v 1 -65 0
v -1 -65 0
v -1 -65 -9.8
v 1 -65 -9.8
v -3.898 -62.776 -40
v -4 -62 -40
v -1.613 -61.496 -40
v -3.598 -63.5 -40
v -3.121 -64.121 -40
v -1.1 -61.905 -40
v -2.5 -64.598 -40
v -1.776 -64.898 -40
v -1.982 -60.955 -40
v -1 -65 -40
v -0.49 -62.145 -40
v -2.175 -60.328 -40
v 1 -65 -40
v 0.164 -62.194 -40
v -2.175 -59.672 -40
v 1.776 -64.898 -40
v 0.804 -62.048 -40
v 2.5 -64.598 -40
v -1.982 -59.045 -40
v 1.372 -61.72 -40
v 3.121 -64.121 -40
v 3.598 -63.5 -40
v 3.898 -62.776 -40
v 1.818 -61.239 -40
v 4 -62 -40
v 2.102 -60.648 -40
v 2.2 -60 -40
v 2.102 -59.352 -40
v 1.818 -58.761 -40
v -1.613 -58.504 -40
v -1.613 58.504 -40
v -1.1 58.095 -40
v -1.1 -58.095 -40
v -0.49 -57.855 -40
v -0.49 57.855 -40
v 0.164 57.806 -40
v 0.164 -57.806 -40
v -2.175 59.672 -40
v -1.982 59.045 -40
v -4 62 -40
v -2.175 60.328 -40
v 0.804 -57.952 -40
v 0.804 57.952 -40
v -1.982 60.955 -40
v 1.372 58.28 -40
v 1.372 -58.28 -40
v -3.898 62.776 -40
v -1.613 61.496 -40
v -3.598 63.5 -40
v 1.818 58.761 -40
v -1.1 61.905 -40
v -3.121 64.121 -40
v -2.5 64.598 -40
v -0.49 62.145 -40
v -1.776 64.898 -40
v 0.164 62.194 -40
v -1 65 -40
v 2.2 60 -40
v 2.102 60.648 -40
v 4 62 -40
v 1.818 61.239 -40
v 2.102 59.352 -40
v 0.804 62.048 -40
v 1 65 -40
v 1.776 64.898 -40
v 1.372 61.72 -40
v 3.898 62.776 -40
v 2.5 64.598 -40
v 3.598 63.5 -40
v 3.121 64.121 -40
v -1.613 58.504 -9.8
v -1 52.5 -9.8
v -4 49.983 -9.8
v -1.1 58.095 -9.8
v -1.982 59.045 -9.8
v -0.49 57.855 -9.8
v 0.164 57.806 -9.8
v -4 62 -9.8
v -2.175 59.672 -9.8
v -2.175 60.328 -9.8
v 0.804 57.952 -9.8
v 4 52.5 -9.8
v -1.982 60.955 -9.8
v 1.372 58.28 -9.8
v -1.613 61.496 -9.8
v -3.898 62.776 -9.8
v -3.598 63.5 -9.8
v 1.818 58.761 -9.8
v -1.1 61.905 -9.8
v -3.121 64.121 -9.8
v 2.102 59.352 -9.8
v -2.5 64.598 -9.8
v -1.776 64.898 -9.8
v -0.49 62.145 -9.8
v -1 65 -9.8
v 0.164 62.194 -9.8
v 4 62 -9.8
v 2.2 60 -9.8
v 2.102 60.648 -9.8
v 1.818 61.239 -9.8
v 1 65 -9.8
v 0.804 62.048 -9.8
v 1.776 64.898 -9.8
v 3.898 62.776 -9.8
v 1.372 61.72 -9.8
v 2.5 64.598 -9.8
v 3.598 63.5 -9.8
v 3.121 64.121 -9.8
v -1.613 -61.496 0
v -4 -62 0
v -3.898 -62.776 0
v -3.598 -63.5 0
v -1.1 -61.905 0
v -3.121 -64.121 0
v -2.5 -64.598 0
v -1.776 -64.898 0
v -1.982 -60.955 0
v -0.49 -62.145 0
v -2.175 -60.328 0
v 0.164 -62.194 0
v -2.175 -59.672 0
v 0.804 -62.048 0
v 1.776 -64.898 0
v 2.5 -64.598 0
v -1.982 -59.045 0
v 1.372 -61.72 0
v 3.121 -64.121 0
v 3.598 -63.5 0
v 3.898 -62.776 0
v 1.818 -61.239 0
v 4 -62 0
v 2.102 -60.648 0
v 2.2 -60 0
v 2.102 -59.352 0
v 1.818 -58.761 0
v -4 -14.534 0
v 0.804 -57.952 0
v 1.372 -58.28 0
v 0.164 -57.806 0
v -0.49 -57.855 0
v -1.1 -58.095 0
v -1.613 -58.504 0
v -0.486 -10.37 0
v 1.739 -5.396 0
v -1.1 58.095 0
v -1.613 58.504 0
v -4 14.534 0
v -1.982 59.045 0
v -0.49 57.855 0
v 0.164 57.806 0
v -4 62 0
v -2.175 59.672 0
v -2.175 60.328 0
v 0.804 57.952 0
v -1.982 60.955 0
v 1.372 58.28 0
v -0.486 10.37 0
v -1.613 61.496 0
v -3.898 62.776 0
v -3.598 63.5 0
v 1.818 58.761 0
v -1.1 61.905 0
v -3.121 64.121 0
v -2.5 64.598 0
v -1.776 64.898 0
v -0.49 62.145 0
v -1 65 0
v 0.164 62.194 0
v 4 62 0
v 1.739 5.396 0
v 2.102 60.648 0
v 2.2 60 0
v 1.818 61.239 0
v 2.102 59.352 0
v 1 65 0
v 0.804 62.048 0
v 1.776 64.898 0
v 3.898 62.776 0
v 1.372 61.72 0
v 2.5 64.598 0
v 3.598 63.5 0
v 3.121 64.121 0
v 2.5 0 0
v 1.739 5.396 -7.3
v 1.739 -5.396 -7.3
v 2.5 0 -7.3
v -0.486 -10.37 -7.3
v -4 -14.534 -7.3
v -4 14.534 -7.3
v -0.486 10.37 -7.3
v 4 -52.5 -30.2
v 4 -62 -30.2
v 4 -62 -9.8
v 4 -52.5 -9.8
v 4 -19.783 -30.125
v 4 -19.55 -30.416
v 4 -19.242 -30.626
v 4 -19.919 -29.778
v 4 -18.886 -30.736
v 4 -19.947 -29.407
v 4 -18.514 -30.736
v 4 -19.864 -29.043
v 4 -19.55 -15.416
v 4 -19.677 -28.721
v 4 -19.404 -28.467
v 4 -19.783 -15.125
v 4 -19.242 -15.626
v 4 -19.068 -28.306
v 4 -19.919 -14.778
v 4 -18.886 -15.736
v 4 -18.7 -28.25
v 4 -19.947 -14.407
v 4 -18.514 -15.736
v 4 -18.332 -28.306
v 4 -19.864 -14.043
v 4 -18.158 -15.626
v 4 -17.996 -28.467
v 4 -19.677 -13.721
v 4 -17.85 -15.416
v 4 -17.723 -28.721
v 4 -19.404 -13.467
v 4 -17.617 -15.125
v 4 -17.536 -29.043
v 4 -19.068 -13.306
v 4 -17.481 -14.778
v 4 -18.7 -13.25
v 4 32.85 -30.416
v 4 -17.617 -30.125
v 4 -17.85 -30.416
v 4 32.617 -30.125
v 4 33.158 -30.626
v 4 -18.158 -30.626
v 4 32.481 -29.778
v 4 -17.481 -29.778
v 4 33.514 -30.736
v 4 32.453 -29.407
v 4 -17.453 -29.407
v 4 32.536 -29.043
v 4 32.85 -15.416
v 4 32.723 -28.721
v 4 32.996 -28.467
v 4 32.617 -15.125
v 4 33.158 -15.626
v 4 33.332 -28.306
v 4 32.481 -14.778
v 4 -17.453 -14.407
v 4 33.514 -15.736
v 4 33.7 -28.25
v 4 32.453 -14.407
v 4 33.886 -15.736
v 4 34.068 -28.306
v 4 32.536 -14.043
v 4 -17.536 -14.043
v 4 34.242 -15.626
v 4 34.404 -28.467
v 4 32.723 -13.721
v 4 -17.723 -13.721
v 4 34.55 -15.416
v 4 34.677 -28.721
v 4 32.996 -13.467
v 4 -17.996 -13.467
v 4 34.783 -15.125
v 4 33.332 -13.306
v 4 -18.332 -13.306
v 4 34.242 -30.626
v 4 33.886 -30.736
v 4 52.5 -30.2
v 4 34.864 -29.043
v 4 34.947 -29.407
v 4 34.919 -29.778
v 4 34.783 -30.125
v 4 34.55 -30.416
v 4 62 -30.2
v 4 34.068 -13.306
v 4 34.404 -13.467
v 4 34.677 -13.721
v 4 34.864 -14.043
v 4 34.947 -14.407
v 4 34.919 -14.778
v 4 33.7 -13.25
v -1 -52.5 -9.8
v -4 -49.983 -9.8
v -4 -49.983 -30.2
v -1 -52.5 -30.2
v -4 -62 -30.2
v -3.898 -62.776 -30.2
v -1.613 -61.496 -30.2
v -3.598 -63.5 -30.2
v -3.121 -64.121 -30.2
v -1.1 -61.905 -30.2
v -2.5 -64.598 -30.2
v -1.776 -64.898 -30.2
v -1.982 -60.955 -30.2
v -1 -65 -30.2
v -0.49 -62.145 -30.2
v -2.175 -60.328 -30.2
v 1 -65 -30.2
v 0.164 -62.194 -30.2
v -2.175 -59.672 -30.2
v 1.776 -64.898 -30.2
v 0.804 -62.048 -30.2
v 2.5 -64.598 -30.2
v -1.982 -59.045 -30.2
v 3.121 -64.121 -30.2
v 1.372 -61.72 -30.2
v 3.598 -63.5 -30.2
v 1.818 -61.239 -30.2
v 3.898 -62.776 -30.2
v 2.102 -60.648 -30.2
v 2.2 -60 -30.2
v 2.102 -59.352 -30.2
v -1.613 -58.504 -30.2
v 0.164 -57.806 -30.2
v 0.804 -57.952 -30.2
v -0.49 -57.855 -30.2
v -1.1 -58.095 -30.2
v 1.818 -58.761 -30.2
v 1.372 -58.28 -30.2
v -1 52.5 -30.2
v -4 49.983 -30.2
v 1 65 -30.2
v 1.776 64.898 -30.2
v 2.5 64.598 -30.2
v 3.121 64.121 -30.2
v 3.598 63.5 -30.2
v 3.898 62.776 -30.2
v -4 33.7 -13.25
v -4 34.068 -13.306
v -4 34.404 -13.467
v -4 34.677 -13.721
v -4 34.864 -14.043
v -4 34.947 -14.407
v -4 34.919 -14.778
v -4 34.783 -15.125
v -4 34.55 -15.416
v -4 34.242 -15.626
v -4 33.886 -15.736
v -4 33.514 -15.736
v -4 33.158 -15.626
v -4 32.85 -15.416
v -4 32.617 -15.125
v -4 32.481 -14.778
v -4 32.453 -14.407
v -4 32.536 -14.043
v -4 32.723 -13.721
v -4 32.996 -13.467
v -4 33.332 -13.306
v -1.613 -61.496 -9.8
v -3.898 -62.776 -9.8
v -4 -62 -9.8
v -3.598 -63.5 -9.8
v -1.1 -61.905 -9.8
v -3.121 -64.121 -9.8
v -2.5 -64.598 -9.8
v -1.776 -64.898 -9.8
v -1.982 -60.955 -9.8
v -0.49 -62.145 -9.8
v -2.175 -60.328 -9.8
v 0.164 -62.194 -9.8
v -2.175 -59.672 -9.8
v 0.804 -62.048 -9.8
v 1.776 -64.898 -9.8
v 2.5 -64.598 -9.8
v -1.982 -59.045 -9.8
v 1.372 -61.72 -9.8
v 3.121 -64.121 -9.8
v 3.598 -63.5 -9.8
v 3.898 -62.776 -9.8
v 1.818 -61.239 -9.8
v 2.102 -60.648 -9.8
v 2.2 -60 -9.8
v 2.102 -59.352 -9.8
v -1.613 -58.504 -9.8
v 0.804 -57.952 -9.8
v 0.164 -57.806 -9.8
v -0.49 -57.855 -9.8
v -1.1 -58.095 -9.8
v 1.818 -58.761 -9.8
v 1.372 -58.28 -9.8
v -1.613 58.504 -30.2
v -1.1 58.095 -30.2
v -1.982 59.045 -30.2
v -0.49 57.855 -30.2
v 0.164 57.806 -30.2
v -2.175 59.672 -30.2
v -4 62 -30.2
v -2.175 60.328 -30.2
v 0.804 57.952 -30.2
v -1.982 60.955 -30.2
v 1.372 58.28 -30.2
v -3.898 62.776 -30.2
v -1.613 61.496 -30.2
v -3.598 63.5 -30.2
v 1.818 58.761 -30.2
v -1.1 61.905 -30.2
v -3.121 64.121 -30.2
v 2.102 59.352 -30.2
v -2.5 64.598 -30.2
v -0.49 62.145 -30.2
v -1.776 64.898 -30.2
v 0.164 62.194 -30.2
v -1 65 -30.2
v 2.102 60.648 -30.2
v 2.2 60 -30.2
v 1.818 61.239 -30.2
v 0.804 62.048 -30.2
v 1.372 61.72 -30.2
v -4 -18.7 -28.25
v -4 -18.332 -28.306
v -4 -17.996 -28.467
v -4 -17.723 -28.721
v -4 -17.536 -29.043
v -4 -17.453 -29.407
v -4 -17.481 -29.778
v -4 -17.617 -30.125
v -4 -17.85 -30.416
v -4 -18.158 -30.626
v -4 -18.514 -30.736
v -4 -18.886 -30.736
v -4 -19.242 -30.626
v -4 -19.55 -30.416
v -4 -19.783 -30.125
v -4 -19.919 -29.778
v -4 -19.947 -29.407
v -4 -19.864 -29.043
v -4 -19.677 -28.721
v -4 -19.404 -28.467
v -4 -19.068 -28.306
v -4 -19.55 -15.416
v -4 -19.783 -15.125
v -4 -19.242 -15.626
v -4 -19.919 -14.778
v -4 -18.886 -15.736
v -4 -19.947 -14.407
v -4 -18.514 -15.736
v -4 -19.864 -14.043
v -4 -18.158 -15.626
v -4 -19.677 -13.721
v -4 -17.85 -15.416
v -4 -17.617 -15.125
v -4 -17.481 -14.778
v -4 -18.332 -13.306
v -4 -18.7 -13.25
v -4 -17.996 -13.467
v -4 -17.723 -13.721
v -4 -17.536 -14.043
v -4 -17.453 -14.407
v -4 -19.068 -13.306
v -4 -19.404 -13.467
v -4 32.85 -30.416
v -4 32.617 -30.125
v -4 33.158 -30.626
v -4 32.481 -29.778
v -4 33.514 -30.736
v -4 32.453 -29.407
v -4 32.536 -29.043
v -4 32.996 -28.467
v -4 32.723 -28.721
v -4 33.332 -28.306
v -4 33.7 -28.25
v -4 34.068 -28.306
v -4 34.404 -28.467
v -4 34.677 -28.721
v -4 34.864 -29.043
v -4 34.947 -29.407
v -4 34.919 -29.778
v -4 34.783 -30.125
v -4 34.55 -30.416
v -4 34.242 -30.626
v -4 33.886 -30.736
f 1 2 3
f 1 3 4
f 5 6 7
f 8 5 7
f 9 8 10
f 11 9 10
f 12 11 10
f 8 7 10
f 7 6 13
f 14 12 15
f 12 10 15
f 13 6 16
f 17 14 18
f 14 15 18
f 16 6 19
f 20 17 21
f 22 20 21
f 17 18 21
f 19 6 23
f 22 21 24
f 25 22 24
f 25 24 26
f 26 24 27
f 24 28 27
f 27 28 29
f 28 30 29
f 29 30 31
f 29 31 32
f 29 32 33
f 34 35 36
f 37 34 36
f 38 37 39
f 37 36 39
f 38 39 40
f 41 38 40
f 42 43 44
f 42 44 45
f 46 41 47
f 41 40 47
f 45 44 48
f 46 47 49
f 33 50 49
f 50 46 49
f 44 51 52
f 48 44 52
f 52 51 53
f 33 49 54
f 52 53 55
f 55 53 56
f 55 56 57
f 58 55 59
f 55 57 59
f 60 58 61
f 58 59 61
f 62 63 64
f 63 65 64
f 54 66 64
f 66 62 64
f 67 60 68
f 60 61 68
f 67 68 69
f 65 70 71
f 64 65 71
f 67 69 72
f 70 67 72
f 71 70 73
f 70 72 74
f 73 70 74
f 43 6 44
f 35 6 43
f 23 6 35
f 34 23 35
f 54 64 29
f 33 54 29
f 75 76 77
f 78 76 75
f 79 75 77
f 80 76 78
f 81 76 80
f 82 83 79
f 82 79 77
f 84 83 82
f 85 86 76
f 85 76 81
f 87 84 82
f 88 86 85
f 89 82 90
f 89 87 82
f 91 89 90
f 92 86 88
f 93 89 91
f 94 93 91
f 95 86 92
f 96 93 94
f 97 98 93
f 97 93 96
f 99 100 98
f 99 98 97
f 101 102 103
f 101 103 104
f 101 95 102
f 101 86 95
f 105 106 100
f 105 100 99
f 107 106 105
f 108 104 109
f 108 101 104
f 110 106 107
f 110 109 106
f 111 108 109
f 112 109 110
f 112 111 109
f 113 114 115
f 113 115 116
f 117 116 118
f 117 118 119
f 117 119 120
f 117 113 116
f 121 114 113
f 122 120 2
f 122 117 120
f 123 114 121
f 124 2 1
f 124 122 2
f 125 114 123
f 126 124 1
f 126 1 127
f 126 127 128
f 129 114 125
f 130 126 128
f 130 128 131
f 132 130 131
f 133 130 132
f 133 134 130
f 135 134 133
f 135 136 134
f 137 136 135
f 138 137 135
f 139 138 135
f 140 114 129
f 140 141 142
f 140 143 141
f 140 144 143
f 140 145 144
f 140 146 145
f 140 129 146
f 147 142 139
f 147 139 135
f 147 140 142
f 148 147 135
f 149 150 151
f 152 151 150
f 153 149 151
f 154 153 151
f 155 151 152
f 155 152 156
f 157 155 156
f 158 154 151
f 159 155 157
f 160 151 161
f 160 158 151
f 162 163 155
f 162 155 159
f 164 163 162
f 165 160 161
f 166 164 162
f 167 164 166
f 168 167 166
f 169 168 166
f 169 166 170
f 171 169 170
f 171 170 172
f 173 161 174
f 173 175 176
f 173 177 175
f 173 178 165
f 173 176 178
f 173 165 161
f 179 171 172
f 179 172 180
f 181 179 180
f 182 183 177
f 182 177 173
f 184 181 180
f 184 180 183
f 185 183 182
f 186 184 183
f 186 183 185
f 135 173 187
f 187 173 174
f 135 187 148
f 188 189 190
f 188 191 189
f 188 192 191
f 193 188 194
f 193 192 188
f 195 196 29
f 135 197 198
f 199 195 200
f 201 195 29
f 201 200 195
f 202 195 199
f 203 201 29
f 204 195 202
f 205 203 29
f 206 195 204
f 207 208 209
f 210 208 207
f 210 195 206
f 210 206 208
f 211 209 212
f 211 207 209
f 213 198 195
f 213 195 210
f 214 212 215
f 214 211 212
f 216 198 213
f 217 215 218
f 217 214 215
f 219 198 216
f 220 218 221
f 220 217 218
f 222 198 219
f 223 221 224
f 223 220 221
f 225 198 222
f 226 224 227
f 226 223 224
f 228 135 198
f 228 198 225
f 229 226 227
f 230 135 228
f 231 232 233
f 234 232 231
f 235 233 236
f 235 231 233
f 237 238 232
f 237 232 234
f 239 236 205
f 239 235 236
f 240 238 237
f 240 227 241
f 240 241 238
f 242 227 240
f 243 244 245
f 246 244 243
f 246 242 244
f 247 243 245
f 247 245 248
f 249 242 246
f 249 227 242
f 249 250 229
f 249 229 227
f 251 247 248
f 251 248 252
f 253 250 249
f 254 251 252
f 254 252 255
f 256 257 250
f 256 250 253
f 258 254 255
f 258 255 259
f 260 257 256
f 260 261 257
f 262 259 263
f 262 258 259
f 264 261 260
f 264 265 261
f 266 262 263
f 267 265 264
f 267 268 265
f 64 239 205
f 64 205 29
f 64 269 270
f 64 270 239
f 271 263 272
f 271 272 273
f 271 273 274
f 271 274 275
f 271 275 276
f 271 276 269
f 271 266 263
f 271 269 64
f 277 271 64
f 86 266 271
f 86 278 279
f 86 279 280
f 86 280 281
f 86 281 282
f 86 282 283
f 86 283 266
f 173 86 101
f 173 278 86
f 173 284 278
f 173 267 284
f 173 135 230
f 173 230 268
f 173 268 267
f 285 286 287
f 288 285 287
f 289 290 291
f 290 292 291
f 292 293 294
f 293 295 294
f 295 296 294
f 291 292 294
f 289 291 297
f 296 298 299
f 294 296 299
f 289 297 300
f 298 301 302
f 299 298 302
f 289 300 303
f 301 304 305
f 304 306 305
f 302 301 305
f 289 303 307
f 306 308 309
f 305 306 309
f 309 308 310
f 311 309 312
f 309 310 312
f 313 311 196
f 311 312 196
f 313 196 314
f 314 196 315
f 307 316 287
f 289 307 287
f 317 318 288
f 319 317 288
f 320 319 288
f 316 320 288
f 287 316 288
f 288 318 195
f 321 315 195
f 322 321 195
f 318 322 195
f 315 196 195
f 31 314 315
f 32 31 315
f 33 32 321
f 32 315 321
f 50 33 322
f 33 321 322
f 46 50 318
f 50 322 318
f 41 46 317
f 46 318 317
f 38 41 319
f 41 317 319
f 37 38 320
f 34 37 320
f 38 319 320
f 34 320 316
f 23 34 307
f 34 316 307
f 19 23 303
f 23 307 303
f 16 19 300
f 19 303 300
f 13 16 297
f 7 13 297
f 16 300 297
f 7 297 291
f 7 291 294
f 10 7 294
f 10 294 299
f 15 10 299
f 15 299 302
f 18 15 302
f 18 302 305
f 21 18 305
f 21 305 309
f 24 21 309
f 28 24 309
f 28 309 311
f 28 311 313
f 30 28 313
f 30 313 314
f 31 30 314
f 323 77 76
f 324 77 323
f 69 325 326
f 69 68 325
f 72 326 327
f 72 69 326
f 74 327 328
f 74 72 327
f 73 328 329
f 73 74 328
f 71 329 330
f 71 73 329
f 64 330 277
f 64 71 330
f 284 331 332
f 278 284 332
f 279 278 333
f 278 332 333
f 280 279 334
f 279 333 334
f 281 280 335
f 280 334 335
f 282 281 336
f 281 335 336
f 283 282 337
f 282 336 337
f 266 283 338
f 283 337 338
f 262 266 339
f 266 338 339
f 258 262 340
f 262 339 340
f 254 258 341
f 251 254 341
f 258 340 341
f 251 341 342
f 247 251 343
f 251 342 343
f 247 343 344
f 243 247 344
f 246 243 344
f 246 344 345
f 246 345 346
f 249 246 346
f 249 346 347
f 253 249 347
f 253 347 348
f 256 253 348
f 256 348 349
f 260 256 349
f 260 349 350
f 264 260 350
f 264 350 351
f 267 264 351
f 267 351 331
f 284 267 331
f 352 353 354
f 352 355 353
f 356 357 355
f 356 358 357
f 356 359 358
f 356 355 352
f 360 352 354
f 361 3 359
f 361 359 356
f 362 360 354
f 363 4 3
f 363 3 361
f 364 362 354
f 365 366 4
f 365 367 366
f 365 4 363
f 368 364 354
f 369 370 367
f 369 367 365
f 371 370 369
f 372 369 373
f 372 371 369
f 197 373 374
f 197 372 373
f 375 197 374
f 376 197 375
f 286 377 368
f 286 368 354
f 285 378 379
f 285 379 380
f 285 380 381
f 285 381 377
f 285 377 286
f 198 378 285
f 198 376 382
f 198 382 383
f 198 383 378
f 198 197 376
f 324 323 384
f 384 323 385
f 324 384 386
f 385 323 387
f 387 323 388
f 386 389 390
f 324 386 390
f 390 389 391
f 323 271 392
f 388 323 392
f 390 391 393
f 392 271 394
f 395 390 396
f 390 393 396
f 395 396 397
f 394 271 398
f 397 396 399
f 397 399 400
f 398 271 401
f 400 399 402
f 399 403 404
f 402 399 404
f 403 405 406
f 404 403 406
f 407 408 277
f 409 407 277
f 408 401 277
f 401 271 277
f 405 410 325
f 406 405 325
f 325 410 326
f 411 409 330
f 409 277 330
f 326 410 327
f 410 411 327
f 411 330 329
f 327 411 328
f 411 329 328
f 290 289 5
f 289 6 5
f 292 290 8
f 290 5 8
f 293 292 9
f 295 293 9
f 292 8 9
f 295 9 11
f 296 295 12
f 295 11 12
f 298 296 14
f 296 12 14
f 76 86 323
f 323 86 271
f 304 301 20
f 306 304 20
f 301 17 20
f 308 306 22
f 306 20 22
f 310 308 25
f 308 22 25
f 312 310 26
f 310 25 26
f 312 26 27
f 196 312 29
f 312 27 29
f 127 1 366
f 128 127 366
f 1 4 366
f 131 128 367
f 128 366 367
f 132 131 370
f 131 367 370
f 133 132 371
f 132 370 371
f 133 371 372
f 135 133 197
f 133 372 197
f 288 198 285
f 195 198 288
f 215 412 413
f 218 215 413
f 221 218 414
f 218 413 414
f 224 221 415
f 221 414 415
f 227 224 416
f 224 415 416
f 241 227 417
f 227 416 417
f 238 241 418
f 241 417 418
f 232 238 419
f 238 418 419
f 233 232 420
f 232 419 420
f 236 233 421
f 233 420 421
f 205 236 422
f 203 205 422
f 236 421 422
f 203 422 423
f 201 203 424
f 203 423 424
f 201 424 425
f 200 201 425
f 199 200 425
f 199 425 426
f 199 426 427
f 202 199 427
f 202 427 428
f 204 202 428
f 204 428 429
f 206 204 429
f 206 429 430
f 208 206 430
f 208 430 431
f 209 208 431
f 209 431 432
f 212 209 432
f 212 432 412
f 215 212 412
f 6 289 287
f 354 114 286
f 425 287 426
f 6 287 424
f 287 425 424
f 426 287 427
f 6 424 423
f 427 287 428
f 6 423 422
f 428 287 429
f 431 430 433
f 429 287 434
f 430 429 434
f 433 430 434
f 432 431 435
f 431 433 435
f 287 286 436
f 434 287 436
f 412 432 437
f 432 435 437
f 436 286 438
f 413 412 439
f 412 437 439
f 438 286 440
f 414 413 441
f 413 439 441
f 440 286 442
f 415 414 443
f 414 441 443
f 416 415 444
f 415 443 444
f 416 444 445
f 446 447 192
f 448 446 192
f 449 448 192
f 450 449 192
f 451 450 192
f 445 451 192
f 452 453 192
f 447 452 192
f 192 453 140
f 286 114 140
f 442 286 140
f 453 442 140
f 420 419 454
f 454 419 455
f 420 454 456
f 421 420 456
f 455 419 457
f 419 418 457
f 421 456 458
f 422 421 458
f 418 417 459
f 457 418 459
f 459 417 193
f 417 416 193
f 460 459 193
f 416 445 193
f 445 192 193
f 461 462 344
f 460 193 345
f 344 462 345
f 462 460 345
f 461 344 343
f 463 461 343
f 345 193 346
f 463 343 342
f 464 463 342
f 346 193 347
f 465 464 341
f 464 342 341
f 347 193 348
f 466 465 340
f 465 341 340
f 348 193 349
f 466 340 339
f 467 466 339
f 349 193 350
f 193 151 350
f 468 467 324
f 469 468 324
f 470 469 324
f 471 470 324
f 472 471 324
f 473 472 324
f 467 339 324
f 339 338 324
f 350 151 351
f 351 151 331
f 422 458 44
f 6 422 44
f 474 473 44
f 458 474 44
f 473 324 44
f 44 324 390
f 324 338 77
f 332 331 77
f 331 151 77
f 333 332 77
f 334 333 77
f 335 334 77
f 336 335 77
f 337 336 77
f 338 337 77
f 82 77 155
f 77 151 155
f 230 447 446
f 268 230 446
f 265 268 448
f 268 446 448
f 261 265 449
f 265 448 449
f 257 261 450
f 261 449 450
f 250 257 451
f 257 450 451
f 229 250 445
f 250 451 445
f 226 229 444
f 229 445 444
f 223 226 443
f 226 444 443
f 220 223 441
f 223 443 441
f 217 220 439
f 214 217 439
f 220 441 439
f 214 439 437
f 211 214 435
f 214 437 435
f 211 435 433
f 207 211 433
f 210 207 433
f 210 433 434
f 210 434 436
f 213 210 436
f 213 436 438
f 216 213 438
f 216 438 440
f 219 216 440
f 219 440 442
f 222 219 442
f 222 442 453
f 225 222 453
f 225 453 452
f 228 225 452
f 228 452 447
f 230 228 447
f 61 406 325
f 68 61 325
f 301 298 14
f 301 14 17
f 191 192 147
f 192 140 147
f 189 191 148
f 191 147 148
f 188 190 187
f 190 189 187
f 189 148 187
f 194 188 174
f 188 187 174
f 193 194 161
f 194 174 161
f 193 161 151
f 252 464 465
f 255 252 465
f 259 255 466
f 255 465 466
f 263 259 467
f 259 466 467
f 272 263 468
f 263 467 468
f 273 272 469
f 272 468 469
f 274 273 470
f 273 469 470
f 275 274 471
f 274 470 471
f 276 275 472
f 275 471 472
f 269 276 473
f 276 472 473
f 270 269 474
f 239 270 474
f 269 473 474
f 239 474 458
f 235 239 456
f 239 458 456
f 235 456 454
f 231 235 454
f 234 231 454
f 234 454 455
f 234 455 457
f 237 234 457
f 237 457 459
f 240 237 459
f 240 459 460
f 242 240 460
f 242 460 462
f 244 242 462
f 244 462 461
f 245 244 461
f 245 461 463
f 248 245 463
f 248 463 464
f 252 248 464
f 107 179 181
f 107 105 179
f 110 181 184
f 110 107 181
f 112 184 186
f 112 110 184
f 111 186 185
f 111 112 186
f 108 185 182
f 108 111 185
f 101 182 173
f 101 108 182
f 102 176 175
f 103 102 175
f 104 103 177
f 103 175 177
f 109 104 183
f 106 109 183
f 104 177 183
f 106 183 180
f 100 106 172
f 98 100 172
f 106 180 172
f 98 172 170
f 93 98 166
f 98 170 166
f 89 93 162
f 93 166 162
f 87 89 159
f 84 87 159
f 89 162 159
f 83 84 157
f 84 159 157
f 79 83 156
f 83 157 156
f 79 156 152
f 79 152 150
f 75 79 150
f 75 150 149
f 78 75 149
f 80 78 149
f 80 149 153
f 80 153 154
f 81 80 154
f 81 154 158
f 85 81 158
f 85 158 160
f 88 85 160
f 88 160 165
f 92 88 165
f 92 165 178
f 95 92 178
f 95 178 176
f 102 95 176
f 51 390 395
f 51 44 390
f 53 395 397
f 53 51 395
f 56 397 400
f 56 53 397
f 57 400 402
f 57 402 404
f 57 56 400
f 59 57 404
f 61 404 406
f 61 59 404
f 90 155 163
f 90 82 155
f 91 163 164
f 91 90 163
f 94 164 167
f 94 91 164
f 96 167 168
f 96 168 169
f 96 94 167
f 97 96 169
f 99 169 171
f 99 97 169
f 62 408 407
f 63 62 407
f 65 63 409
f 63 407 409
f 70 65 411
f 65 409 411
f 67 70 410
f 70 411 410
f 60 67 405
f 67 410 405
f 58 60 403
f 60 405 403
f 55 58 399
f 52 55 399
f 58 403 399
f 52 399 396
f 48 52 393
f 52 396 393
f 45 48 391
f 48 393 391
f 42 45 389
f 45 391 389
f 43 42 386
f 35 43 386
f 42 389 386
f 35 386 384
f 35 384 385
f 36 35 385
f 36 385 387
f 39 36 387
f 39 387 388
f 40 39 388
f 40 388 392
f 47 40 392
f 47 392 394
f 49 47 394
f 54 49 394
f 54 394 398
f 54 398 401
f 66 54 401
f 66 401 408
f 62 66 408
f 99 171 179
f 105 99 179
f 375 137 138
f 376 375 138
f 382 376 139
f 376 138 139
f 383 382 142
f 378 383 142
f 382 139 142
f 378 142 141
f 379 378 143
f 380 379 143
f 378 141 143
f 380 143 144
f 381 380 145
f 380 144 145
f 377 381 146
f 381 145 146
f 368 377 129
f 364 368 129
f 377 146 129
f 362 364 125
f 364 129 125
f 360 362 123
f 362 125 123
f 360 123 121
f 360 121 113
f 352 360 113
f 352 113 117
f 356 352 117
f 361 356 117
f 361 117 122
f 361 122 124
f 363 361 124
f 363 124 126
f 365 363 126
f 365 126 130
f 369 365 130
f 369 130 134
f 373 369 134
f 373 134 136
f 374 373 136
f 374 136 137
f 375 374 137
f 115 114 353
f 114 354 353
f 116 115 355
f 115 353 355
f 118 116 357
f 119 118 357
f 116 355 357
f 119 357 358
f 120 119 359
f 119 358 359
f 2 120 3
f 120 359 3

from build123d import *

# Parameters (mm, degrees)
SKETCH1_W             = 8
SKETCH1_H             = 130
BOSS_EXTRUDE1_DEPTH   = 40
SKETCH2_W             = 20.4
SKETCH2_H             = 25
CUT_EXTRUDE1_DEPTH    = 9
FILLET1_R             = 3
SKETCH3_R             = 2.2
CUT_EXTRUDE2_DEPTH    = 41
SKETCH4_R             = 19.5
CUT_EXTRUDE3_DEPTH    = 7.3
CUT_EXTRUDE5_REACH    = 10
SKETCH6_R             = 1.25
CHAMFER1_SIZE         = 3
CHAMFER1_SIZE2        = 2.517298894
CHAMFER1_PART_2_SIZE  = 3
CHAMFER1_PART_2_SIZE2 = 2.517298894


with BuildPart() as part:
    # Sketch1 → Boss-Extrude1 (new body)
    with BuildSketch(Plane.XY):
        Rectangle(SKETCH1_W, SKETCH1_H)
    extrude(amount=-BOSS_EXTRUDE1_DEPTH)

    # Sketch2 → Cut-Extrude1 (cut, through all)
    with BuildSketch(Plane(origin=(4, 0, 0), x_dir=(0, 0, -1), z_dir=(1, 0, 0))):
        with Locations((20, 65)):
            Rectangle(SKETCH2_W, SKETCH2_H)
        with Locations((20, -65)):
            Rectangle(SKETCH2_W, SKETCH2_H)
    extrude(amount=-CUT_EXTRUDE1_DEPTH, mode=Mode.SUBTRACT)

    # Fillet1
    fillet1_edges = [part.edges().sort_by_distance(p)[0] for p in [
        (4, 65, -4.9),
        (-4, 65, -4.9),
        (-4, -65, -4.9),
        (4, -65, -4.9),
        (4, -65, -35.1),
        (-4, -65, -35.1),
        (-4, 65, -35.1),
        (4, 65, -35.1),
    ]]
    fillet(fillet1_edges, radius=FILLET1_R)

    # Sketch3 → Cut-Extrude2 (cut, through all)
    with BuildSketch(Plane.XY):
        with Locations((0, 60)):
            Circle(SKETCH3_R)
        with Locations((0, -60)):
            Circle(SKETCH3_R)
    extrude(amount=-CUT_EXTRUDE2_DEPTH, mode=Mode.SUBTRACT)

    # Sketch4 → Cut-Extrude3 (cut)
    with BuildSketch(Plane.XY):
        with Locations((-17, 0)):
            Circle(SKETCH4_R)
    extrude(amount=-CUT_EXTRUDE3_DEPTH, mode=Mode.SUBTRACT)

    # Sketch6 → Cut-Extrude5 (cut, up to next)
    with BuildSketch(Plane.ZY.offset(4), mode=Mode.PRIVATE) as cut_extrude5_sk1:
        with Locations((-29.5, 33.7)):
            Circle(SKETCH6_R)
    cut_extrude5_tool1 = extrude(cut_extrude5_sk1.sketch, amount=-CUT_EXTRUDE5_REACH, mode=Mode.PRIVATE) & part.part
    add(cut_extrude5_tool1.solids().sort_by_distance((-4, 33.7, -29.5))[0], mode=Mode.SUBTRACT)
    # Sketch6 → Cut-Extrude5 (cut, up to next)
    with BuildSketch(Plane.ZY.offset(4), mode=Mode.PRIVATE) as cut_extrude5_sk2:
        with Locations((-29.5, -18.7)):
            Circle(SKETCH6_R)
    cut_extrude5_tool2 = extrude(cut_extrude5_sk2.sketch, amount=-CUT_EXTRUDE5_REACH, mode=Mode.PRIVATE) & part.part
    add(cut_extrude5_tool2.solids().sort_by_distance((-4, -18.7, -29.5))[0], mode=Mode.SUBTRACT)
    # Sketch6 → Cut-Extrude5 (cut, up to next)
    with BuildSketch(Plane.ZY.offset(4), mode=Mode.PRIVATE) as cut_extrude5_sk3:
        with Locations((-14.5, 33.7)):
            Circle(SKETCH6_R)
    cut_extrude5_tool3 = extrude(cut_extrude5_sk3.sketch, amount=-CUT_EXTRUDE5_REACH, mode=Mode.PRIVATE) & part.part
    add(cut_extrude5_tool3.solids().sort_by_distance((-4, 33.7, -14.5))[0], mode=Mode.SUBTRACT)
    # Sketch6 → Cut-Extrude5 (cut, up to next)
    with BuildSketch(Plane.ZY.offset(4), mode=Mode.PRIVATE) as cut_extrude5_sk4:
        with Locations((-14.5, -18.7)):
            Circle(SKETCH6_R)
    cut_extrude5_tool4 = extrude(cut_extrude5_sk4.sketch, amount=-CUT_EXTRUDE5_REACH, mode=Mode.PRIVATE) & part.part
    add(cut_extrude5_tool4.solids().sort_by_distance((-4, -18.7, -14.5))[0], mode=Mode.SUBTRACT)

    # Chamfer1
    chamfer1_edges = [part.edges().sort_by_distance(p)[0] for p in [
        (-4, 52.5, -20),
    ]]
    chamfer1_side = [part.faces().sort_by_distance(p)[0] for p in [
        (0, 52.5, -20),
    ]]
    chamfer(chamfer1_edges, length=CHAMFER1_SIZE, length2=CHAMFER1_SIZE2, reference=chamfer1_side[0])

    # Chamfer1 part 2
    chamfer1_part_2_edges = [part.edges().sort_by_distance(p)[0] for p in [
        (-4, -52.5, -20),
    ]]
    chamfer1_part_2_side = [part.faces().sort_by_distance(p)[0] for p in [
        (0, -52.5, -20),
    ]]
    chamfer(chamfer1_part_2_edges, length=CHAMFER1_PART_2_SIZE, length2=CHAMFER1_PART_2_SIZE2, reference=chamfer1_part_2_side[0])


solid = part.part
